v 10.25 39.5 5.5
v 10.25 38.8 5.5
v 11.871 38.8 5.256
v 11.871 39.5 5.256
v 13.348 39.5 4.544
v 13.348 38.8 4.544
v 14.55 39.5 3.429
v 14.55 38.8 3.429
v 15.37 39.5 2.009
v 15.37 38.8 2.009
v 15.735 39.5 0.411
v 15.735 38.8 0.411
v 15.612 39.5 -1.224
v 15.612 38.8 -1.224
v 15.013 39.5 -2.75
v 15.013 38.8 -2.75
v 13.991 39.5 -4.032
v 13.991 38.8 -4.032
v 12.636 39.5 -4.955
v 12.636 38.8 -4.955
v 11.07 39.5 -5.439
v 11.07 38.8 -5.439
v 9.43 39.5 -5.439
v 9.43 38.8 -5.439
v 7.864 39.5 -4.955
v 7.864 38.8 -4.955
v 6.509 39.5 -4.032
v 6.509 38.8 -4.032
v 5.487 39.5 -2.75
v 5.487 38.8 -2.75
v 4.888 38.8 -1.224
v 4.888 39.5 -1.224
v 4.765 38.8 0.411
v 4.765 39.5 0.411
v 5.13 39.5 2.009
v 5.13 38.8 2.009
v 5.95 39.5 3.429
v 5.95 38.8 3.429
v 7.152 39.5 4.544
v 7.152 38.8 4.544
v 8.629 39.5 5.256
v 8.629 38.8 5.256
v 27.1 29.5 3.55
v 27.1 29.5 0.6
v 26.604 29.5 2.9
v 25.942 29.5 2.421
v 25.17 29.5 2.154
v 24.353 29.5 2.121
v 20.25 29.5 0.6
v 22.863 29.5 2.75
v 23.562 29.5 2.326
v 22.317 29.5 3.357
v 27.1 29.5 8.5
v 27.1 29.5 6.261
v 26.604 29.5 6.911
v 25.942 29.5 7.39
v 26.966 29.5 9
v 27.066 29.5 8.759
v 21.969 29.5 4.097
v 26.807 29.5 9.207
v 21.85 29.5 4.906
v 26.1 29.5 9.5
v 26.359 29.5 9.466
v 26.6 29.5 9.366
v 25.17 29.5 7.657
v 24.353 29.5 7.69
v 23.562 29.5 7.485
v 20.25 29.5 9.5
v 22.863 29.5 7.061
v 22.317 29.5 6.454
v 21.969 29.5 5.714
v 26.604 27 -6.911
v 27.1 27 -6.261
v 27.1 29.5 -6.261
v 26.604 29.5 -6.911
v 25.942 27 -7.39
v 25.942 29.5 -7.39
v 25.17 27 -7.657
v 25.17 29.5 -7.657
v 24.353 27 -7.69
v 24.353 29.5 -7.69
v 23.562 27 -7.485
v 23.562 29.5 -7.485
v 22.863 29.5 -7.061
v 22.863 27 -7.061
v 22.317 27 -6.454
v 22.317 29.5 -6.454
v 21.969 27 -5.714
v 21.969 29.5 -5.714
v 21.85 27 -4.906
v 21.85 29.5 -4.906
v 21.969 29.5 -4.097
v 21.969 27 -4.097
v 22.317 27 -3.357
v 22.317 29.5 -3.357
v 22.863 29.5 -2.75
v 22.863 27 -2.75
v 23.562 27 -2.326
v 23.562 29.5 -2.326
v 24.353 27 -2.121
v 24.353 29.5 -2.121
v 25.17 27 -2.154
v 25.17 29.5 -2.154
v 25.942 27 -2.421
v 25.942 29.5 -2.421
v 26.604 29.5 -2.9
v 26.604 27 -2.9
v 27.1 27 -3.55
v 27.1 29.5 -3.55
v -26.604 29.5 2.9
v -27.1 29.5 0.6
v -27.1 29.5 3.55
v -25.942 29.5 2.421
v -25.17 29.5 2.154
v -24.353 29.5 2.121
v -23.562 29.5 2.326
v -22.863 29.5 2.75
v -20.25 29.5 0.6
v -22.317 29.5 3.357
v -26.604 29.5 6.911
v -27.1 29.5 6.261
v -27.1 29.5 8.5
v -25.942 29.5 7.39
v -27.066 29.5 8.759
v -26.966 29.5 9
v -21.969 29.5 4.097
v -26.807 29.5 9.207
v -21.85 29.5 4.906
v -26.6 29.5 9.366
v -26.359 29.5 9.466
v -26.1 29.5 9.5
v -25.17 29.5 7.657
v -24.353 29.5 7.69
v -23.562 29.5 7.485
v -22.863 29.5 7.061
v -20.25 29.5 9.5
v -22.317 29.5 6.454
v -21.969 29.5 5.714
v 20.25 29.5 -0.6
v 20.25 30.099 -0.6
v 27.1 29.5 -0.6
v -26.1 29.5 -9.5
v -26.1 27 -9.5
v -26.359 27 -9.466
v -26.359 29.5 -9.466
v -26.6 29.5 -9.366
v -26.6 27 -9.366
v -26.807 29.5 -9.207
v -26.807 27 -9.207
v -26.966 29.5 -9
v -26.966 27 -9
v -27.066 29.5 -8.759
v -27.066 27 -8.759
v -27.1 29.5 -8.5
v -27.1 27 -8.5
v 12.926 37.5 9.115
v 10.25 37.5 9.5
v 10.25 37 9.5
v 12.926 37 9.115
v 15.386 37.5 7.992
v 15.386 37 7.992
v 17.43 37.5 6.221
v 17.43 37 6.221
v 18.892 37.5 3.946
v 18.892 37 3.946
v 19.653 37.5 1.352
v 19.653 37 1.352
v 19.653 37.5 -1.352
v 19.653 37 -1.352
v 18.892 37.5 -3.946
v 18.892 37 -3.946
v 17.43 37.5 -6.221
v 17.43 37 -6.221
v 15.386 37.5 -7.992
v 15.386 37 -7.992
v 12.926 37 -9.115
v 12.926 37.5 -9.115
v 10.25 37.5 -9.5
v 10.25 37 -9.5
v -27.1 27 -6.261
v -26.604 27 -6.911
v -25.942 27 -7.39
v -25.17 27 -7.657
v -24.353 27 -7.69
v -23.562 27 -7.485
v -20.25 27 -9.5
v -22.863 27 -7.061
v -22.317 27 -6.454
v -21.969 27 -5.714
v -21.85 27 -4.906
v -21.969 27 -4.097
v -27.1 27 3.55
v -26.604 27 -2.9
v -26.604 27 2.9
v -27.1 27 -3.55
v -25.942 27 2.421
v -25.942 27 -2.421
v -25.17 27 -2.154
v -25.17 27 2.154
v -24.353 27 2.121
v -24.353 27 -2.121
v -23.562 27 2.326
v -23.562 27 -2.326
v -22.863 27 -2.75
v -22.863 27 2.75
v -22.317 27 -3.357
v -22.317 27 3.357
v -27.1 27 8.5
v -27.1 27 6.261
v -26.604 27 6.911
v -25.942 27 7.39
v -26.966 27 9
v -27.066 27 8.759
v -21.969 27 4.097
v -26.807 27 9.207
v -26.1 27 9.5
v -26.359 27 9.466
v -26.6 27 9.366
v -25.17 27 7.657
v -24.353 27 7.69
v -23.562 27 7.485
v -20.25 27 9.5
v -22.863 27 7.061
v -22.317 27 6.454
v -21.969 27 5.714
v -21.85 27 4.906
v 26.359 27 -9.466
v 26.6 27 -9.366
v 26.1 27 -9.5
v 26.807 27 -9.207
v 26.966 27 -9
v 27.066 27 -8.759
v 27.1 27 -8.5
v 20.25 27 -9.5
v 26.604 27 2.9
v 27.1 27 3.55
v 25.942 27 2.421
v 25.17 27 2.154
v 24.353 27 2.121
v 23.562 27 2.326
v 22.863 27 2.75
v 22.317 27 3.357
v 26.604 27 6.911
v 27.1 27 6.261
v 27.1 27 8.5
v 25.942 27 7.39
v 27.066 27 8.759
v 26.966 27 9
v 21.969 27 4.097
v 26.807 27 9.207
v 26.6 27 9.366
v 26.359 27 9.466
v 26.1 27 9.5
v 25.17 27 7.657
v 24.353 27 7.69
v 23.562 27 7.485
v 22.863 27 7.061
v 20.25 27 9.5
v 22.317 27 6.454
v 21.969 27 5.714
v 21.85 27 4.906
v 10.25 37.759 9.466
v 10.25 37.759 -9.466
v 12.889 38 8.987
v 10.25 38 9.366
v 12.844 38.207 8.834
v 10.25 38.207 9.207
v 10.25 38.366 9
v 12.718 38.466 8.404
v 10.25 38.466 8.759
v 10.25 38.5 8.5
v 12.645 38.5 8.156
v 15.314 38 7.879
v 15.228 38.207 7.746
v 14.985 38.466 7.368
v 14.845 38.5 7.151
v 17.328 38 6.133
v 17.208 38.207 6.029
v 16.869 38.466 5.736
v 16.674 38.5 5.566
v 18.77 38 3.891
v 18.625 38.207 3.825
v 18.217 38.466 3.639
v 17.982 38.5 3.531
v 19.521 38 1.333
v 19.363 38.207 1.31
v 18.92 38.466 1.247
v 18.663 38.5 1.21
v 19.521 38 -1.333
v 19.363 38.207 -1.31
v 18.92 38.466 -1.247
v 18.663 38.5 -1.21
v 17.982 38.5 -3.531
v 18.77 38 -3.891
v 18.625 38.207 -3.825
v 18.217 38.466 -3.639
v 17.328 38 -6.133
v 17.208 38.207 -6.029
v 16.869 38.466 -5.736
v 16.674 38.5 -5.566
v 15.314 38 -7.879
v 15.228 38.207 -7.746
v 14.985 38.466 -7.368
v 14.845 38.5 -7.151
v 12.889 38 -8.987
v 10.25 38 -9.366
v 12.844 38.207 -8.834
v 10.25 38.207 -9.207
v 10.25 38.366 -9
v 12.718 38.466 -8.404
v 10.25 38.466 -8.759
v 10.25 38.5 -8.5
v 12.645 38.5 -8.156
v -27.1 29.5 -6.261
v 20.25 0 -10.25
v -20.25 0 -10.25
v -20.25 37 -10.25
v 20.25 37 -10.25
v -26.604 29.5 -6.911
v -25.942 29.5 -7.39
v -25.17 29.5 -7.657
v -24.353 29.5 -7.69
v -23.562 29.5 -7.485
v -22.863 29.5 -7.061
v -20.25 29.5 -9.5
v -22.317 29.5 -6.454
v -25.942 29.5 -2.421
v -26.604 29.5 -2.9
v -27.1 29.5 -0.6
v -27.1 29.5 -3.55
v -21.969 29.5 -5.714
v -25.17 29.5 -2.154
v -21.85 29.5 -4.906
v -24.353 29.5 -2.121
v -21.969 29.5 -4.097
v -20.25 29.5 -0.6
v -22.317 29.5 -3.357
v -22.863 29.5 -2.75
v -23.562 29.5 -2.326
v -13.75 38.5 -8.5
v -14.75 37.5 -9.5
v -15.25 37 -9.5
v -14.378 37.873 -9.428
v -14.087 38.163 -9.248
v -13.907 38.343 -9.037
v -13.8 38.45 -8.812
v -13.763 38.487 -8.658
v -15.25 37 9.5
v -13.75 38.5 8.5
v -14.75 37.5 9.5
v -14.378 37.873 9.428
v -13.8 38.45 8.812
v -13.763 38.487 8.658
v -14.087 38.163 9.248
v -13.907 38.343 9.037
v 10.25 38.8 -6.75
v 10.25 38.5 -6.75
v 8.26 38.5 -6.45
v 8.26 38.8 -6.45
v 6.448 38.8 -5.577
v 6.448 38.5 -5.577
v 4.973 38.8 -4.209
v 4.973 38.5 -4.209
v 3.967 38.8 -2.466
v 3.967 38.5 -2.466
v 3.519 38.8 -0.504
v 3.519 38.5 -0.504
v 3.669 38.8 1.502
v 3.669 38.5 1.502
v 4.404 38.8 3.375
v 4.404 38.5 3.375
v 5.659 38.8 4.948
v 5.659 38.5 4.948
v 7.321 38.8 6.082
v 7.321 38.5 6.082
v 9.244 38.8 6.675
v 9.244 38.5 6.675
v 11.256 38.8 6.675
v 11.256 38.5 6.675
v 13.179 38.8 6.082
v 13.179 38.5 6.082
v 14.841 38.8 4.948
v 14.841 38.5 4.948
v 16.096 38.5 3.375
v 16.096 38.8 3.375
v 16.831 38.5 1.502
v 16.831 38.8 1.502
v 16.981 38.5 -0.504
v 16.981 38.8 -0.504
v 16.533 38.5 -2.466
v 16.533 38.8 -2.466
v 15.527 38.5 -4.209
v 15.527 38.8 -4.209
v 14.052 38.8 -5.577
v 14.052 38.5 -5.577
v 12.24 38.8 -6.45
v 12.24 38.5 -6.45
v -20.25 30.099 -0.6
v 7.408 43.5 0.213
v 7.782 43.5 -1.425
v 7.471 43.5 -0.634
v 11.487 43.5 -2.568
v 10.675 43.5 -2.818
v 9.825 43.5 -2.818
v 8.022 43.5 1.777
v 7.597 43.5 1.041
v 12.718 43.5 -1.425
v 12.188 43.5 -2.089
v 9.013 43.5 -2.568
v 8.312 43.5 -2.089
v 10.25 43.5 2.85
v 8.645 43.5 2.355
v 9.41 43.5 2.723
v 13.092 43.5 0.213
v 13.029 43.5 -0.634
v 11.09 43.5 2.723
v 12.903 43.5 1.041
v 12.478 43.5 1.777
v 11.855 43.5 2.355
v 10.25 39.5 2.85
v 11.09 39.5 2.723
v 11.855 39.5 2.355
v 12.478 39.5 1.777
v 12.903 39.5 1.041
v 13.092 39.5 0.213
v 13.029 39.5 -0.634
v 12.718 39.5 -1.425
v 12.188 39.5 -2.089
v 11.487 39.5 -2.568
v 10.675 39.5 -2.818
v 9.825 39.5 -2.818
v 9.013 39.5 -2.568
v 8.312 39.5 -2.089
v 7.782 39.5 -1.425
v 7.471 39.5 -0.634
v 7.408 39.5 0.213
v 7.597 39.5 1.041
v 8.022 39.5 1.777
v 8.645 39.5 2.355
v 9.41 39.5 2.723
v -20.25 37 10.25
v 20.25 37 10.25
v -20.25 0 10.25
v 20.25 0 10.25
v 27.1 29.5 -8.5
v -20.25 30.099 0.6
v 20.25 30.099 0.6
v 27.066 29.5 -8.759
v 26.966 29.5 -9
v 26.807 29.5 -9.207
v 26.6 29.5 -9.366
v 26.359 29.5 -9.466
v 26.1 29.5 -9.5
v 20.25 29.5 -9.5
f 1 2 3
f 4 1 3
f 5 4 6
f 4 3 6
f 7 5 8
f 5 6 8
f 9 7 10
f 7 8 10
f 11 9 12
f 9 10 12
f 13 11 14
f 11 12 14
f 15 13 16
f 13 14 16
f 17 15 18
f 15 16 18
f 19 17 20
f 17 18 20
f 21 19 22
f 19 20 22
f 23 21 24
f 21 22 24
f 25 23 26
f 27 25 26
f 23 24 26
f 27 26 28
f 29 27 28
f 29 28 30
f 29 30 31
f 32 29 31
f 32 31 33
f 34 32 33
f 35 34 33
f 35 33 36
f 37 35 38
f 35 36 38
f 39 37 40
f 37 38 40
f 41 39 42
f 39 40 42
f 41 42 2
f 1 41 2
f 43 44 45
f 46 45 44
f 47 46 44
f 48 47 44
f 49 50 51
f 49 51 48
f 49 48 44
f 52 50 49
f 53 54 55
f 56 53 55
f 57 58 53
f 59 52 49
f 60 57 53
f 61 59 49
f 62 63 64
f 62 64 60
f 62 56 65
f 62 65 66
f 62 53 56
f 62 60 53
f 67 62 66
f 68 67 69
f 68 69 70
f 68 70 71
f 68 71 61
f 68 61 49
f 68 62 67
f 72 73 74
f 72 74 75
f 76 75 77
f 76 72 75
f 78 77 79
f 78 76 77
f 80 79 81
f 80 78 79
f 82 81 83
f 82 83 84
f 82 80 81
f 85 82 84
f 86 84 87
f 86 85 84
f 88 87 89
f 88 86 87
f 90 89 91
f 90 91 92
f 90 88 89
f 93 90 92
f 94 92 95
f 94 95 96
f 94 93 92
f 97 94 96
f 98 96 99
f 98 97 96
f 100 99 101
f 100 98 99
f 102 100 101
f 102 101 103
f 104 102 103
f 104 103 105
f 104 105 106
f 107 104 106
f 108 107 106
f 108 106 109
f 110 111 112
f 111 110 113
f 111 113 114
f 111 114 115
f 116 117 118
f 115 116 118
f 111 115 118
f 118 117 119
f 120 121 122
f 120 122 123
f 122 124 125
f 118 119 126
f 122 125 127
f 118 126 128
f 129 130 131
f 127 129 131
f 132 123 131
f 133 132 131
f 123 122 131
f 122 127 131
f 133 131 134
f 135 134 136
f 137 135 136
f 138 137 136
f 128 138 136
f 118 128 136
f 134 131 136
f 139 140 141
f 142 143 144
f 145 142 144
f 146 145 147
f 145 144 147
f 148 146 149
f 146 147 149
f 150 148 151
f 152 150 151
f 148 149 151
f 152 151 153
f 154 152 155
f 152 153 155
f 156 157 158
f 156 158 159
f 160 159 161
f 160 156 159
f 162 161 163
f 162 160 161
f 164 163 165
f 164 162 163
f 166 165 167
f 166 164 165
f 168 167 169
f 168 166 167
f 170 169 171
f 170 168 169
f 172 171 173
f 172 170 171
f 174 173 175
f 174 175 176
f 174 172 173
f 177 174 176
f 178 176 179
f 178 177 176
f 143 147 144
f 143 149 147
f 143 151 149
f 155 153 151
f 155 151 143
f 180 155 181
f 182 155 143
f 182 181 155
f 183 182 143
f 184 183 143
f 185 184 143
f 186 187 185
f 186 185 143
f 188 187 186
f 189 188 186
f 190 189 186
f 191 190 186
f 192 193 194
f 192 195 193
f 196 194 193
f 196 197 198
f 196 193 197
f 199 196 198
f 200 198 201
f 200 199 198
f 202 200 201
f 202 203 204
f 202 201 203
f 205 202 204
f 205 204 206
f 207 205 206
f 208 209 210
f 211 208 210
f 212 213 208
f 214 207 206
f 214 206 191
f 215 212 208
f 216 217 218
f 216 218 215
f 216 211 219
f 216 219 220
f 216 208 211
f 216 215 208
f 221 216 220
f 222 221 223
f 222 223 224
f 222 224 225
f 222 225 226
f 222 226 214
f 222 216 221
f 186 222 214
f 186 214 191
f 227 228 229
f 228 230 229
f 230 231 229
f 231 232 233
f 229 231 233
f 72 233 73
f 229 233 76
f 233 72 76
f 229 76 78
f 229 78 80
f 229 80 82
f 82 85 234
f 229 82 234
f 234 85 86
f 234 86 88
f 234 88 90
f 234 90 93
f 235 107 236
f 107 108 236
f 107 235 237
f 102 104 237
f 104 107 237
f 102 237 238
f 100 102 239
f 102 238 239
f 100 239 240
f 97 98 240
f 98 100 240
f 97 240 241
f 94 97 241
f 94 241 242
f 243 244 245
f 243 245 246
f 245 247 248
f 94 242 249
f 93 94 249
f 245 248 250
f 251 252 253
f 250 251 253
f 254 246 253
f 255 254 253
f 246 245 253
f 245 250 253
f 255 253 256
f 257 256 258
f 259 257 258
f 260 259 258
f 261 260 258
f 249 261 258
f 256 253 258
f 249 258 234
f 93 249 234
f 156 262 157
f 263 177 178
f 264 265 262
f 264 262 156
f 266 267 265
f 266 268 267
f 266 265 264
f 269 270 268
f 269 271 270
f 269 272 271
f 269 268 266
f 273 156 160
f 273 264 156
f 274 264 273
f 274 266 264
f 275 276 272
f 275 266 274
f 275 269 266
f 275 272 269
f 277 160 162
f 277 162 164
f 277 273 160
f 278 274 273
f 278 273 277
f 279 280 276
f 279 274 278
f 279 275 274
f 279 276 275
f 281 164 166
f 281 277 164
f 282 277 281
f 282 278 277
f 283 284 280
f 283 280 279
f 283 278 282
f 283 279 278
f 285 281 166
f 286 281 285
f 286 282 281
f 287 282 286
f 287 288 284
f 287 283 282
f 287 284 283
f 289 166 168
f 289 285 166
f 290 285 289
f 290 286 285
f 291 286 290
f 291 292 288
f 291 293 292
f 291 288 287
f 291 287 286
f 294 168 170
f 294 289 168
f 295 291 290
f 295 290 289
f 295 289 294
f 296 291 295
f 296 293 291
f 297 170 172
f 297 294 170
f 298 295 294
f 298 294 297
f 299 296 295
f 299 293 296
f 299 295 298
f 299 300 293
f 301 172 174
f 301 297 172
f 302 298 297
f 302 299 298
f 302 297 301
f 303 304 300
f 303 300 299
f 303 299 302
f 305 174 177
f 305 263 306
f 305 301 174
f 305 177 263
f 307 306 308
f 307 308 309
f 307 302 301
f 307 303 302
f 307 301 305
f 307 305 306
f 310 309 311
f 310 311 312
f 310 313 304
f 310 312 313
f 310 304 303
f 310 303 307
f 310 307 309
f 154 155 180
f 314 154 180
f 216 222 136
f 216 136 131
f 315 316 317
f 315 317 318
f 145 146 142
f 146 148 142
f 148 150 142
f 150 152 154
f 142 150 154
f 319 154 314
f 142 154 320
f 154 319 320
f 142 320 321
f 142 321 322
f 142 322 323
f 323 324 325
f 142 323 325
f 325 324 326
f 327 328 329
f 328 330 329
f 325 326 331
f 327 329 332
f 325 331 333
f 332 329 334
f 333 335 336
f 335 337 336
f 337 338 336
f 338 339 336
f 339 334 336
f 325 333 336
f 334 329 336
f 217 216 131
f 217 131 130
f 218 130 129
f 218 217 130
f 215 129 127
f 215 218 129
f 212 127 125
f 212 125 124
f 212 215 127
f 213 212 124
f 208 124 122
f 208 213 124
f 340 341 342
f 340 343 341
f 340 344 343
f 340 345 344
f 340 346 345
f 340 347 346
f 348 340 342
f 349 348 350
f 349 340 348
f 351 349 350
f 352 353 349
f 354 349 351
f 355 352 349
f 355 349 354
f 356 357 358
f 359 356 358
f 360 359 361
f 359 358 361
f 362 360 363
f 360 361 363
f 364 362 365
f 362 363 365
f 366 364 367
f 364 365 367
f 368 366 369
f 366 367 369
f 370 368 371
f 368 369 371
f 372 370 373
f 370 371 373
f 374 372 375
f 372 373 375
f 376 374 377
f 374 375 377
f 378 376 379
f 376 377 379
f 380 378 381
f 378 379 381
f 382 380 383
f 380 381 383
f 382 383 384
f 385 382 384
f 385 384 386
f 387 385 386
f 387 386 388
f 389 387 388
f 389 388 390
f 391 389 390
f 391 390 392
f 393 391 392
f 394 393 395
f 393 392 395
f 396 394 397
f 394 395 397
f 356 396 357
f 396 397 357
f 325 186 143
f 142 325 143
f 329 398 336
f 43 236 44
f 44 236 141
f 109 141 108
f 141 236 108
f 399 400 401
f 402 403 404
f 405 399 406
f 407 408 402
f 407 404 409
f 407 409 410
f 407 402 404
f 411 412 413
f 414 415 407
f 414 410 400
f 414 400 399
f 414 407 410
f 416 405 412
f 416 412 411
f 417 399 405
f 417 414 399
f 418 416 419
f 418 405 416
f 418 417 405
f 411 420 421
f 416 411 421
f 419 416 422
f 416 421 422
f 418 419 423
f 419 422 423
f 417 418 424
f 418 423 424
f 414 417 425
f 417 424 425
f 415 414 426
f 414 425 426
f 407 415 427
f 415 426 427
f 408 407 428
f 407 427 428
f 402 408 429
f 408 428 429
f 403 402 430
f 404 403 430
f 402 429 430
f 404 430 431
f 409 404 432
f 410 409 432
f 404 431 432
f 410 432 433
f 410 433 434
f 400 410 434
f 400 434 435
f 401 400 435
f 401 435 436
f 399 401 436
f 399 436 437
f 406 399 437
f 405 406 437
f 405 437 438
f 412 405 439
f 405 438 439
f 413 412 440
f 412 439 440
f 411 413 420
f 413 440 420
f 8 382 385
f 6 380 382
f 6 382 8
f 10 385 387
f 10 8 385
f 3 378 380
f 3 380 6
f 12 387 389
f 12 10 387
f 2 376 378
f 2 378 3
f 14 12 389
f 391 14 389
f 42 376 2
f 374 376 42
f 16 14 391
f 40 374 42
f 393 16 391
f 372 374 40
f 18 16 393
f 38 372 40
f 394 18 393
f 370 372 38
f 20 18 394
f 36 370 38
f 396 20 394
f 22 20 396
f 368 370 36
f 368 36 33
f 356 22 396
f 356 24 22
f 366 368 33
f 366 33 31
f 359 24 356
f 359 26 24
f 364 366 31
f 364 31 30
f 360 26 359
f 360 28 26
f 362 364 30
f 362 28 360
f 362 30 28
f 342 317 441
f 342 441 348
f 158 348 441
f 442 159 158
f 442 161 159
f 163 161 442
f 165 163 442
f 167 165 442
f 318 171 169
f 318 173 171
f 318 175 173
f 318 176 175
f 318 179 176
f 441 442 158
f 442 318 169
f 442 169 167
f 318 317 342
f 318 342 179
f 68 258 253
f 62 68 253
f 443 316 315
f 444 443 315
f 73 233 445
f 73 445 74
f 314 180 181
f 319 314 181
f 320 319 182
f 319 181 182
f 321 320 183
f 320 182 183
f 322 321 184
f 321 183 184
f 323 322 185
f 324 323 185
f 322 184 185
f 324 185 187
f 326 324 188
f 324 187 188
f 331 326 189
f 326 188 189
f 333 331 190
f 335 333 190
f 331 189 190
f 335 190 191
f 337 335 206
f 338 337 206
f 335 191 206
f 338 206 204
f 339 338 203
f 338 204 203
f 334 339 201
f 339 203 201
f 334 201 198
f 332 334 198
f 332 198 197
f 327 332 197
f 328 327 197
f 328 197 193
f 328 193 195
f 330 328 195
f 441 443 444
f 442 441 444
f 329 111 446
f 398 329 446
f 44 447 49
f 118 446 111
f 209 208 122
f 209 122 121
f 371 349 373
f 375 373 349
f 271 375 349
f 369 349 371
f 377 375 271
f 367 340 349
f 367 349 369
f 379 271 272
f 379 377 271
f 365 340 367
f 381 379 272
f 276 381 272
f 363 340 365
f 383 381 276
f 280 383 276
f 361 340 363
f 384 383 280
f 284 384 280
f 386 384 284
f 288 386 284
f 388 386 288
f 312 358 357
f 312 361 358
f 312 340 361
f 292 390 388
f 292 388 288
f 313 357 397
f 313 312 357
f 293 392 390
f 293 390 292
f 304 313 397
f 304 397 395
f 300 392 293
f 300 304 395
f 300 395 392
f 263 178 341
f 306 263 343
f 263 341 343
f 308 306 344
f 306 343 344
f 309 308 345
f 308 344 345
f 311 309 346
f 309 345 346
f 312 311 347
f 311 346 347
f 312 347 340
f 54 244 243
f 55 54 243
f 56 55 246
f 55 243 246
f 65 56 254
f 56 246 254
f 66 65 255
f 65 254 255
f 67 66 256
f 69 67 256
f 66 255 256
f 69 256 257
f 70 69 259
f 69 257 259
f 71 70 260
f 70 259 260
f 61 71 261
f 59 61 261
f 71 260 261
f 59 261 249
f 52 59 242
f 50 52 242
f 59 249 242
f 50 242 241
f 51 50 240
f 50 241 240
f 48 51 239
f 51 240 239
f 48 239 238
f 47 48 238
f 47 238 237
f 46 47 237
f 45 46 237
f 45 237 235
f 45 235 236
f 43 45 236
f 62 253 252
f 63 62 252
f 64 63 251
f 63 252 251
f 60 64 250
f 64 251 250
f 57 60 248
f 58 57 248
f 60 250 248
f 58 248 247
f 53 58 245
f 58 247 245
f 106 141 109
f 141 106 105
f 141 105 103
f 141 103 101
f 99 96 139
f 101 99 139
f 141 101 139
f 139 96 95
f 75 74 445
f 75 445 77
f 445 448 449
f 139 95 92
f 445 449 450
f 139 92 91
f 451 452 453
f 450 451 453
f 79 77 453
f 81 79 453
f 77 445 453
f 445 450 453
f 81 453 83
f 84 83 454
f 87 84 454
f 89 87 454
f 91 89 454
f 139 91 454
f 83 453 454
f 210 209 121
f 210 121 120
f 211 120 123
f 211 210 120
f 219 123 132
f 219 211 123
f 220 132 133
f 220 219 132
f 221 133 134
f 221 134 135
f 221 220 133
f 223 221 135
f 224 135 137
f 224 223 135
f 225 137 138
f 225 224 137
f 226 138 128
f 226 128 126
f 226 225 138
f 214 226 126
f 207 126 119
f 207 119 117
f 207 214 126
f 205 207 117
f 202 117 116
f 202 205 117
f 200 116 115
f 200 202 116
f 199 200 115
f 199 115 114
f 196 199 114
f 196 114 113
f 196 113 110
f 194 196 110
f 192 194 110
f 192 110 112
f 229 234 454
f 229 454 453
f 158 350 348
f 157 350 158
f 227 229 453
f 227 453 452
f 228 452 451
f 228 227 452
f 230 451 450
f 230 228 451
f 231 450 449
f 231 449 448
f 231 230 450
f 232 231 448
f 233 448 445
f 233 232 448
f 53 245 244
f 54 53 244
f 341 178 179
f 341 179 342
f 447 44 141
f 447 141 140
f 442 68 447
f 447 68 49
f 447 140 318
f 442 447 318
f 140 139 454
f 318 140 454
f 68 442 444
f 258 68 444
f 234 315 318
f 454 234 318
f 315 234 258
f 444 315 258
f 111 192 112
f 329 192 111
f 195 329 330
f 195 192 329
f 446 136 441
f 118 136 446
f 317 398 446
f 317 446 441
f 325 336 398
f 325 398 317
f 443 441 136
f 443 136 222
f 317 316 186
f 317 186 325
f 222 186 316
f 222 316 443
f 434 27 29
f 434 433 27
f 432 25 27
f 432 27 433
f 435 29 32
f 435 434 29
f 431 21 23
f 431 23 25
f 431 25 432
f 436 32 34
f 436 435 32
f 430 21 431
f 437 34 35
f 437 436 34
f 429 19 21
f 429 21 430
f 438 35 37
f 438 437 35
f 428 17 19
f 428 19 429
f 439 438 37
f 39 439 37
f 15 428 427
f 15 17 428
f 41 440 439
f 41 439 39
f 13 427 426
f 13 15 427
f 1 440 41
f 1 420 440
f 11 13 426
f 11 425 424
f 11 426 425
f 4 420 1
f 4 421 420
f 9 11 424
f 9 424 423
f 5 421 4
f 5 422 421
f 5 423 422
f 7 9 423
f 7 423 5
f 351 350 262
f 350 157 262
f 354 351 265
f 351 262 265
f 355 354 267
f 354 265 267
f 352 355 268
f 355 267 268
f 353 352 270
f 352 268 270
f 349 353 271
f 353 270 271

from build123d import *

# Parameters (mm, degrees)
CROQUIS1_W              = 40.5
CROQUIS1_H              = 20.5
SALIENTE_EXTRUIR1_DEPTH = 38.5
SALIENTE_EXTRUIR2_START = -11.5
SALIENTE_EXTRUIR2_DEPTH = 2.5
SALIENTE_EXTRUIR6_DEPTH = 0.6
SIMETR_A2_START         = -11.5
SIMETR_A2_COPY_1_DEPTH  = 2.5
CROQUIS4_W              = 40.5
CROQUIS4_H              = 20.5
CORTAR_EXTRUIR3_DEPTH   = 1.5
CHAFL_N1_SIZE           = 1.5
REDONDEO1_R             = 1
CROQUIS5_R              = 6.75
SALIENTE_EXTRUIR3_DEPTH = 0.3
CROQUIS6_R              = 5.5
SALIENTE_EXTRUIR4_DEPTH = 0.7
CROQUIS7_R              = 2.85
SALIENTE_EXTRUIR5_DEPTH = 4


with BuildPart() as part:
    # Croquis1 → Saliente-Extruir1 (new body)
    with BuildSketch(Plane(origin=(0, 0, 0), x_dir=(1, 0, 0), z_dir=(0, 1, 0))):
        Rectangle(CROQUIS1_W, CROQUIS1_H)
    extrude(amount=SALIENTE_EXTRUIR1_DEPTH)

    # Croquis2 → Saliente-Extruir2 (add)
    with BuildSketch(Plane(origin=(0, 38.5, 0), x_dir=(1, 0, 0), z_dir=(0, 1, 0)).offset(SALIENTE_EXTRUIR2_START)):
        with BuildLine():
            Line((-20.25, 9.5), (-26.1, 9.5))
            ThreePointArc((-26.1, 9.5), (-26.807106781, 9.207106781), (-27.1, 8.5))
            Line((-27.1, 8.5), (-27.1, 6.261088342))
            ThreePointArc((-27.1, 6.261088342), (-21.85, 4.905544171), (-27.1, 3.55))
            Line((-27.1, 3.55), (-27.1, 0))
            Line((-27.1, 0), (-20.25, 0))
            Line((-20.25, 0), (-20.25, 9.5))
        make_face()
    saliente_extruir2 = extrude(amount=SALIENTE_EXTRUIR2_DEPTH)

    # Simetría1: Saliente-Extruir2 across plane
    add(saliente_extruir2.mirror(Plane(origin=(0, 0, 0), x_dir=(1, 0, 0), z_dir=(0, 0, -1))))

    # Croquis8 → Saliente-Extruir6 (add, symmetric)
    with BuildSketch(Plane.XY):
        Polygon((-27.1, 29.5), (-20.25, 30.099297345), (-20.25, 29.5), align=None)
    saliente_extruir6 = extrude(amount=SALIENTE_EXTRUIR6_DEPTH, both=True)

    # Simetría2: Saliente-Extruir2, Saliente-Extruir6 across plane
    add(saliente_extruir2.mirror(Plane(origin=(0, 0, 0), x_dir=(0, 0, 1), z_dir=(1, 0, 0))))
    add(saliente_extruir6.mirror(Plane(origin=(0, 0, 0), x_dir=(0, 0, 1), z_dir=(1, 0, 0))))

    # Simetría2 copy 1 sketch → Simetría2 copy 1 (add)
    with BuildSketch(Plane(origin=(0, 38.5, 0), x_dir=(-1, 0, 0), z_dir=(0, 1, 0)).offset(SIMETR_A2_START)):
        with BuildLine():
            Line((-20.25, 9.5), (-26.1, 9.5))
            ThreePointArc((-26.1, 9.5), (-26.807106781, 9.207106781), (-27.1, 8.5))
            Line((-27.1, 8.5), (-27.1, 6.261088342))
            ThreePointArc((-27.1, 6.261088342), (-21.85, 4.905544171), (-27.1, 3.55))
            Line((-27.1, 3.55), (-27.1, 0))
            Line((-27.1, 0), (-20.25, 0))
            Line((-20.25, 0), (-20.25, 9.5))
        make_face()
    extrude(amount=SIMETR_A2_COPY_1_DEPTH)

    # Croquis4 → Cortar-Extruir3 (cut)
    with BuildSketch(Plane(origin=(0, 38.5, 0), x_dir=(1, 0, 0), z_dir=(0, 1, 0))):
        Rectangle(CROQUIS4_W, CROQUIS4_H)
        with BuildLine():
            Line((-15.25, 9.5), (-15.25, -9.5))
            Line((-15.25, -9.5), (10.25, -9.5))
            ThreePointArc((10.25, -9.5), (19.75, 0), (10.25, 9.5))
            Line((10.25, 9.5), (-15.25, 9.5))
        make_face(mode=Mode.SUBTRACT)
    extrude(amount=-CORTAR_EXTRUIR3_DEPTH, mode=Mode.SUBTRACT)

    # Chaflán1
    chafl_n1_edges = [part.edges().sort_by_distance(p)[0] for p in [
        (-15.25, 38.5, 0),
    ]]
    chamfer(chafl_n1_edges, length=CHAFL_N1_SIZE - 0.0001)  # a hair under: the kernel refuses the full size

    # Redondeo1
    redondeo1_edges = [part.edges().sort_by_distance(p)[0] for p in [
        (-1.75005, 38.5, -9.5),
        (19.75, 38.5, 0),
        (-1.75005, 38.5, 9.5),
    ]]
    fillet(redondeo1_edges, radius=REDONDEO1_R)

    # Croquis5 → Saliente-Extruir3 (add)
    with BuildSketch(Plane(origin=(0, 38.5, 0), x_dir=(1, 0, 0), z_dir=(0, 1, 0))):
        with Locations(Location((10.25, 0, 0), (0, 0, 90))):
            Circle(CROQUIS5_R)
    extrude(amount=SALIENTE_EXTRUIR3_DEPTH)

    # Croquis6 → Saliente-Extruir4 (add)
    with BuildSketch(Plane(origin=(0, 38.8, 0), x_dir=(1, 0, 0), z_dir=(0, 1, 0))):
        with Locations(Location((10.25, 0, 0), (0, 0, 270))):
            Circle(CROQUIS6_R)
    extrude(amount=SALIENTE_EXTRUIR4_DEPTH)

    # Croquis7 → Saliente-Extruir5 (add)
    with BuildSketch(Plane(origin=(0, 39.5, 0), x_dir=(1, 0, 0), z_dir=(0, 1, 0))):
        with Locations(Location((10.25, 0, 0), (0, 0, 270))):
            Circle(CROQUIS7_R)
    extrude(amount=SALIENTE_EXTRUIR5_DEPTH)


solid = part.part
